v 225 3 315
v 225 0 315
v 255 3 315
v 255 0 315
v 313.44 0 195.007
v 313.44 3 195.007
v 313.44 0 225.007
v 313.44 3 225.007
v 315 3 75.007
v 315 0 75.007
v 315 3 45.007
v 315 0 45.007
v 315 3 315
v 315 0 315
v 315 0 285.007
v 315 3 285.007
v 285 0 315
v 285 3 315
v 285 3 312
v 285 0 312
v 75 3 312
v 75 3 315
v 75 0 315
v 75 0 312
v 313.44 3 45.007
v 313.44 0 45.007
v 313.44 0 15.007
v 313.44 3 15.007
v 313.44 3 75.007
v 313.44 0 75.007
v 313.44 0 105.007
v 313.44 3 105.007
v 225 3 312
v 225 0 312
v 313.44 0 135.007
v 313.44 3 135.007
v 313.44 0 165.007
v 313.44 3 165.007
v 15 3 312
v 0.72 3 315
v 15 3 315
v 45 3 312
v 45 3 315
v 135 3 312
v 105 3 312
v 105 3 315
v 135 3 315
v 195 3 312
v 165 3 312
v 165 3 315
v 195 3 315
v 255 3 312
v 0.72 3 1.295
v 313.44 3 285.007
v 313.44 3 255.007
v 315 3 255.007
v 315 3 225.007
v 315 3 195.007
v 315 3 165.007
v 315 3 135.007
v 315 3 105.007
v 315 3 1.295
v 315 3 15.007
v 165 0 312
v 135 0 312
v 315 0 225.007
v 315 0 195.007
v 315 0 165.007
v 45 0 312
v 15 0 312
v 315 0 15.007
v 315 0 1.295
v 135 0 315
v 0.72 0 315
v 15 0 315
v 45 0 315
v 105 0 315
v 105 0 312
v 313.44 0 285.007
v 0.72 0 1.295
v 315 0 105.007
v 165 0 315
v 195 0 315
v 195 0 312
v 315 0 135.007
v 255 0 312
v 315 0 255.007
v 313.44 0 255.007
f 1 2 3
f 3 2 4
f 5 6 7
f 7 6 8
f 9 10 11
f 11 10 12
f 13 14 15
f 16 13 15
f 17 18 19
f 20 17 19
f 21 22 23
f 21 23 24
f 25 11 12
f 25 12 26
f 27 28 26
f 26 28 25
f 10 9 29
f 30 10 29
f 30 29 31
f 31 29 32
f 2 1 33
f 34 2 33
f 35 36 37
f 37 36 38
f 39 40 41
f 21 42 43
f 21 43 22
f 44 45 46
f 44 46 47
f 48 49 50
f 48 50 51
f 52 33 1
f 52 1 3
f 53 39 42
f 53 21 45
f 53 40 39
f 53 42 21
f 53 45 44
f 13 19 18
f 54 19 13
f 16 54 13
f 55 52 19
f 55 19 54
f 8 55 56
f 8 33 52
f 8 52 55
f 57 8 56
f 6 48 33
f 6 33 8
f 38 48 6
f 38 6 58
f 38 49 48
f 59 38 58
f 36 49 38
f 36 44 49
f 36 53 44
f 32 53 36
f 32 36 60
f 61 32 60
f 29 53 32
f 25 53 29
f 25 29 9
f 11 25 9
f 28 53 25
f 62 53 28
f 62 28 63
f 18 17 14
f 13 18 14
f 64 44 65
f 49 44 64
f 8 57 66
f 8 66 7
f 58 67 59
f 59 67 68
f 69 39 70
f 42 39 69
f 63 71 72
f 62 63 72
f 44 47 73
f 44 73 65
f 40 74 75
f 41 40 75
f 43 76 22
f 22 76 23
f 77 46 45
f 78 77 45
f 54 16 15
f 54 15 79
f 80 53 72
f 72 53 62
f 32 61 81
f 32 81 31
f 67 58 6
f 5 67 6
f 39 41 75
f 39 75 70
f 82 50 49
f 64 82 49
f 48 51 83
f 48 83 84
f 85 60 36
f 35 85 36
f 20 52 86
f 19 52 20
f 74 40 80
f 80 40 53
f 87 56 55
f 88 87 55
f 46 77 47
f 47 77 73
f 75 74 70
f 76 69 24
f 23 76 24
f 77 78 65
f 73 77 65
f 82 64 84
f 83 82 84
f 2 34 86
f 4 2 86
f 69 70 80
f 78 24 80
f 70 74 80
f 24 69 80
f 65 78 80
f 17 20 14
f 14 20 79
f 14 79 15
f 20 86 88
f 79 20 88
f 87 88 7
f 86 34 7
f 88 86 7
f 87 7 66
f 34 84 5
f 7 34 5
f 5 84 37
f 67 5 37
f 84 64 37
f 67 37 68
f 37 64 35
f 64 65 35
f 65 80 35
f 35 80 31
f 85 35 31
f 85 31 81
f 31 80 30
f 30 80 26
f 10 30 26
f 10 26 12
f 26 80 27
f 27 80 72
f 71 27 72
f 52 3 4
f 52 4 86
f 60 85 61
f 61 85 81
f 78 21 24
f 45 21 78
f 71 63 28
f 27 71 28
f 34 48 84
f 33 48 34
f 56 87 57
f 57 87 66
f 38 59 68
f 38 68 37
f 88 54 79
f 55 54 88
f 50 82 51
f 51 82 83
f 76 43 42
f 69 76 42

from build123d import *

# Parameters (mm, degrees)
SKETCH1_W               = 630
SKETCH1_H               = 630
BOSS_EXTRUDE1_DEPTH     = 3
SKETCH3_W               = 3
SKETCH3_H               = 30
CUT_EXTRUDE2_DEPTH      = 3
LPATTERN2_COUNT         = 10
LPATTERN2_PITCH         = 60
MIRROR1_COPY_1_SKETCH_W = 3
MIRROR1_COPY_1_SKETCH_H = 30
MIRROR1_COPY_1_DEPTH    = 3
MIRROR1_COPY_2_SKETCH_W = 3
MIRROR1_COPY_2_SKETCH_H = 30
MIRROR1_COPY_2_DEPTH    = 3
MIRROR1_COPY_3_SKETCH_W = 3
MIRROR1_COPY_3_SKETCH_H = 30
MIRROR1_COPY_3_DEPTH    = 3
MIRROR1_COPY_4_SKETCH_W = 3
MIRROR1_COPY_4_SKETCH_H = 30
MIRROR1_COPY_4_DEPTH    = 3
MIRROR1_COPY_5_SKETCH_W = 3
MIRROR1_COPY_5_SKETCH_H = 30
MIRROR1_COPY_5_DEPTH    = 3
MIRROR1_COPY_6_SKETCH_W = 3
MIRROR1_COPY_6_SKETCH_H = 30
MIRROR1_COPY_6_DEPTH    = 3
MIRROR1_COPY_7_SKETCH_W = 3
MIRROR1_COPY_7_SKETCH_H = 30
MIRROR1_COPY_7_DEPTH    = 3
MIRROR1_COPY_8_SKETCH_W = 3
MIRROR1_COPY_8_SKETCH_H = 30
MIRROR1_COPY_8_DEPTH    = 3
MIRROR1_COPY_9_SKETCH_W = 3
MIRROR1_COPY_9_SKETCH_H = 30
MIRROR1_COPY_9_DEPTH    = 3
SKETCH5_W               = 30
SKETCH5_H               = 3
CUT_EXTRUDE3_DEPTH      = 3
LPATTERN3_COUNT         = 10
LPATTERN3_PITCH         = 60
MIRROR2_COPY_1_SKETCH_W = 30
MIRROR2_COPY_1_SKETCH_H = 3
MIRROR2_COPY_1_DEPTH    = 3
MIRROR2_COPY_2_SKETCH_W = 30
MIRROR2_COPY_2_SKETCH_H = 3
MIRROR2_COPY_2_DEPTH    = 3
MIRROR2_COPY_3_SKETCH_W = 30
MIRROR2_COPY_3_SKETCH_H = 3
MIRROR2_COPY_3_DEPTH    = 3
MIRROR2_COPY_4_SKETCH_W = 30
MIRROR2_COPY_4_SKETCH_H = 3
MIRROR2_COPY_4_DEPTH    = 3
MIRROR2_COPY_5_SKETCH_W = 30
MIRROR2_COPY_5_SKETCH_H = 3
MIRROR2_COPY_5_DEPTH    = 3
MIRROR2_COPY_6_SKETCH_W = 30
MIRROR2_COPY_6_SKETCH_H = 3
MIRROR2_COPY_6_DEPTH    = 3
MIRROR2_COPY_7_SKETCH_W = 30
MIRROR2_COPY_7_SKETCH_H = 3
MIRROR2_COPY_7_DEPTH    = 3
MIRROR2_COPY_8_SKETCH_W = 30
MIRROR2_COPY_8_SKETCH_H = 3
MIRROR2_COPY_8_DEPTH    = 3
MIRROR2_COPY_9_SKETCH_W = 30
MIRROR2_COPY_9_SKETCH_H = 3
MIRROR2_COPY_9_DEPTH    = 3


with BuildPart() as part:
    # Sketch1 → Boss-Extrude1 (new body)
    with BuildSketch(Plane(origin=(0, 0, 0), x_dir=(1, 0, 0), z_dir=(0, 1, 0))):
        Rectangle(SKETCH1_W, SKETCH1_H)
    extrude(amount=BOSS_EXTRUDE1_DEPTH)

    # Sketch3 → Cut-Extrude2 (cut)
    with BuildSketch(Plane(origin=(0, 3, 0), x_dir=(1, 0, 0), z_dir=(0, 1, 0))):
        with Locations((-313.5, -270.006843512)):
            Rectangle(SKETCH3_W, SKETCH3_H)
    cut_extrude2 = extrude(amount=-CUT_EXTRUDE2_DEPTH, mode=Mode.SUBTRACT)

    # LPattern2: Cut-Extrude2 ×10
    with Locations(*[(0, 0, -i * LPATTERN2_PITCH) for i in range(1, LPATTERN2_COUNT)]):
        add(cut_extrude2, mode=Mode.SUBTRACT)

    # Mirror1: Cut-Extrude2 across plane
    add(cut_extrude2.mirror(Plane(origin=(0.72, 0, 0), x_dir=(0, 0, 1), z_dir=(1, 0, 0))), mode=Mode.SUBTRACT)

    # Mirror1 copy 1 sketch → Mirror1 copy 1 (cut)
    with BuildSketch(Plane(origin=(1.44, 3, -60), x_dir=(-1, 0, 0), z_dir=(0, 1, 0))):
        with Locations((-313.5, 270.006843512)):
            Rectangle(MIRROR1_COPY_1_SKETCH_W, MIRROR1_COPY_1_SKETCH_H)
    extrude(amount=-MIRROR1_COPY_1_DEPTH, mode=Mode.SUBTRACT)

    # Mirror1 copy 2 sketch → Mirror1 copy 2 (cut)
    with BuildSketch(Plane(origin=(1.44, 3, -120), x_dir=(-1, 0, 0), z_dir=(0, 1, 0))):
        with Locations((-313.5, 270.006843512)):
            Rectangle(MIRROR1_COPY_2_SKETCH_W, MIRROR1_COPY_2_SKETCH_H)
    extrude(amount=-MIRROR1_COPY_2_DEPTH, mode=Mode.SUBTRACT)

    # Mirror1 copy 3 sketch → Mirror1 copy 3 (cut)
    with BuildSketch(Plane(origin=(1.44, 3, -180), x_dir=(-1, 0, 0), z_dir=(0, 1, 0))):
        with Locations((-313.5, 270.006843512)):
            Rectangle(MIRROR1_COPY_3_SKETCH_W, MIRROR1_COPY_3_SKETCH_H)
    extrude(amount=-MIRROR1_COPY_3_DEPTH, mode=Mode.SUBTRACT)

    # Mirror1 copy 4 sketch → Mirror1 copy 4 (cut)
    with BuildSketch(Plane(origin=(1.44, 3, -240), x_dir=(-1, 0, 0), z_dir=(0, 1, 0))):
        with Locations((-313.5, 270.006843512)):
            Rectangle(MIRROR1_COPY_4_SKETCH_W, MIRROR1_COPY_4_SKETCH_H)
    extrude(amount=-MIRROR1_COPY_4_DEPTH, mode=Mode.SUBTRACT)

    # Mirror1 copy 5 sketch → Mirror1 copy 5 (cut)
    with BuildSketch(Plane(origin=(1.44, 3, -300), x_dir=(-1, 0, 0), z_dir=(0, 1, 0))):
        with Locations((-313.5, 270.006843512)):
            Rectangle(MIRROR1_COPY_5_SKETCH_W, MIRROR1_COPY_5_SKETCH_H)
    extrude(amount=-MIRROR1_COPY_5_DEPTH, mode=Mode.SUBTRACT)

    # Mirror1 copy 6 sketch → Mirror1 copy 6 (cut)
    with BuildSketch(Plane(origin=(1.44, 3, -360), x_dir=(-1, 0, 0), z_dir=(0, 1, 0))):
        with Locations((-313.5, 270.006843512)):
            Rectangle(MIRROR1_COPY_6_SKETCH_W, MIRROR1_COPY_6_SKETCH_H)
    extrude(amount=-MIRROR1_COPY_6_DEPTH, mode=Mode.SUBTRACT)

    # Mirror1 copy 7 sketch → Mirror1 copy 7 (cut)
    with BuildSketch(Plane(origin=(1.44, 3, -420), x_dir=(-1, 0, 0), z_dir=(0, 1, 0))):
        with Locations((-313.5, 270.006843512)):
            Rectangle(MIRROR1_COPY_7_SKETCH_W, MIRROR1_COPY_7_SKETCH_H)
    extrude(amount=-MIRROR1_COPY_7_DEPTH, mode=Mode.SUBTRACT)

    # Mirror1 copy 8 sketch → Mirror1 copy 8 (cut)
    with BuildSketch(Plane(origin=(1.44, 3, -480), x_dir=(-1, 0, 0), z_dir=(0, 1, 0))):
        with Locations((-313.5, 270.006843512)):
            Rectangle(MIRROR1_COPY_8_SKETCH_W, MIRROR1_COPY_8_SKETCH_H)
    extrude(amount=-MIRROR1_COPY_8_DEPTH, mode=Mode.SUBTRACT)

    # Mirror1 copy 9 sketch → Mirror1 copy 9 (cut)
    with BuildSketch(Plane(origin=(1.44, 3, -540), x_dir=(-1, 0, 0), z_dir=(0, 1, 0))):
        with Locations((-313.5, 270.006843512)):
            Rectangle(MIRROR1_COPY_9_SKETCH_W, MIRROR1_COPY_9_SKETCH_H)
    extrude(amount=-MIRROR1_COPY_9_DEPTH, mode=Mode.SUBTRACT)

    # Sketch5 → Cut-Extrude3 (cut)
    with BuildSketch(Plane(origin=(0, 3, 0), x_dir=(1, 0, 0), z_dir=(0, 1, 0))):
        with Locations((-270.000314512, -313.5)):
            Rectangle(SKETCH5_W, SKETCH5_H)
    cut_extrude3 = extrude(amount=-CUT_EXTRUDE3_DEPTH, mode=Mode.SUBTRACT)

    # LPattern3: Cut-Extrude3 ×10
    with Locations(*[(i * LPATTERN3_PITCH, 0, 0) for i in range(1, LPATTERN3_COUNT)]):
        add(cut_extrude3, mode=Mode.SUBTRACT)

    # Mirror2: Cut-Extrude3 across plane
    add(cut_extrude3.mirror(Plane.XY.offset(1.295)), mode=Mode.SUBTRACT)

    # Mirror2 copy 1 sketch → Mirror2 copy 1 (cut)
    with BuildSketch(Plane(origin=(60, 3, 2.59), x_dir=(1, 0, 0), z_dir=(0, 1, 0))):
        with Locations((-270.000314512, 313.5)):
            Rectangle(MIRROR2_COPY_1_SKETCH_W, MIRROR2_COPY_1_SKETCH_H)
    extrude(amount=-MIRROR2_COPY_1_DEPTH, mode=Mode.SUBTRACT)

    # Mirror2 copy 2 sketch → Mirror2 copy 2 (cut)
    with BuildSketch(Plane(origin=(120, 3, 2.59), x_dir=(1, 0, 0), z_dir=(0, 1, 0))):
        with Locations((-270.000314512, 313.5)):
            Rectangle(MIRROR2_COPY_2_SKETCH_W, MIRROR2_COPY_2_SKETCH_H)
    extrude(amount=-MIRROR2_COPY_2_DEPTH, mode=Mode.SUBTRACT)

    # Mirror2 copy 3 sketch → Mirror2 copy 3 (cut)
    with BuildSketch(Plane(origin=(180, 3, 2.59), x_dir=(1, 0, 0), z_dir=(0, 1, 0))):
        with Locations((-270.000314512, 313.5)):
            Rectangle(MIRROR2_COPY_3_SKETCH_W, MIRROR2_COPY_3_SKETCH_H)
    extrude(amount=-MIRROR2_COPY_3_DEPTH, mode=Mode.SUBTRACT)

    # Mirror2 copy 4 sketch → Mirror2 copy 4 (cut)
    with BuildSketch(Plane(origin=(240, 3, 2.59), x_dir=(1, 0, 0), z_dir=(0, 1, 0))):
        with Locations((-270.000314512, 313.5)):
            Rectangle(MIRROR2_COPY_4_SKETCH_W, MIRROR2_COPY_4_SKETCH_H)
    extrude(amount=-MIRROR2_COPY_4_DEPTH, mode=Mode.SUBTRACT)

    # Mirror2 copy 5 sketch → Mirror2 copy 5 (cut)
    with BuildSketch(Plane(origin=(300, 3, 2.59), x_dir=(1, 0, 0), z_dir=(0, 1, 0))):
        with Locations((-270.000314512, 313.5)):
            Rectangle(MIRROR2_COPY_5_SKETCH_W, MIRROR2_COPY_5_SKETCH_H)
    extrude(amount=-MIRROR2_COPY_5_DEPTH, mode=Mode.SUBTRACT)

    # Mirror2 copy 6 sketch → Mirror2 copy 6 (cut)
    with BuildSketch(Plane(origin=(360, 3, 2.59), x_dir=(1, 0, 0), z_dir=(0, 1, 0))):
        with Locations((-270.000314512, 313.5)):
            Rectangle(MIRROR2_COPY_6_SKETCH_W, MIRROR2_COPY_6_SKETCH_H)
    extrude(amount=-MIRROR2_COPY_6_DEPTH, mode=Mode.SUBTRACT)

    # Mirror2 copy 7 sketch → Mirror2 copy 7 (cut)
    with BuildSketch(Plane(origin=(420, 3, 2.59), x_dir=(1, 0, 0), z_dir=(0, 1, 0))):
        with Locations((-270.000314512, 313.5)):
            Rectangle(MIRROR2_COPY_7_SKETCH_W, MIRROR2_COPY_7_SKETCH_H)
    extrude(amount=-MIRROR2_COPY_7_DEPTH, mode=Mode.SUBTRACT)

    # Mirror2 copy 8 sketch → Mirror2 copy 8 (cut)
    with BuildSketch(Plane(origin=(480, 3, 2.59), x_dir=(1, 0, 0), z_dir=(0, 1, 0))):
        with Locations((-270.000314512, 313.5)):
            Rectangle(MIRROR2_COPY_8_SKETCH_W, MIRROR2_COPY_8_SKETCH_H)
    extrude(amount=-MIRROR2_COPY_8_DEPTH, mode=Mode.SUBTRACT)

    # Mirror2 copy 9 sketch → Mirror2 copy 9 (cut)
    with BuildSketch(Plane(origin=(540, 3, 2.59), x_dir=(1, 0, 0), z_dir=(0, 1, 0))):
        with Locations((-270.000314512, 313.5)):
            Rectangle(MIRROR2_COPY_9_SKETCH_W, MIRROR2_COPY_9_SKETCH_H)
    extrude(amount=-MIRROR2_COPY_9_DEPTH, mode=Mode.SUBTRACT)

    # SurfaceCut1
    split(bisect_by=Plane.XY.offset(1.295), keep=Keep.TOP)

    # SurfaceCut2
    split(bisect_by=Plane(origin=(0.72, 0, 0), x_dir=(0, 0, -1), z_dir=(1, 0, 0)), keep=Keep.TOP)


solid = part.part
